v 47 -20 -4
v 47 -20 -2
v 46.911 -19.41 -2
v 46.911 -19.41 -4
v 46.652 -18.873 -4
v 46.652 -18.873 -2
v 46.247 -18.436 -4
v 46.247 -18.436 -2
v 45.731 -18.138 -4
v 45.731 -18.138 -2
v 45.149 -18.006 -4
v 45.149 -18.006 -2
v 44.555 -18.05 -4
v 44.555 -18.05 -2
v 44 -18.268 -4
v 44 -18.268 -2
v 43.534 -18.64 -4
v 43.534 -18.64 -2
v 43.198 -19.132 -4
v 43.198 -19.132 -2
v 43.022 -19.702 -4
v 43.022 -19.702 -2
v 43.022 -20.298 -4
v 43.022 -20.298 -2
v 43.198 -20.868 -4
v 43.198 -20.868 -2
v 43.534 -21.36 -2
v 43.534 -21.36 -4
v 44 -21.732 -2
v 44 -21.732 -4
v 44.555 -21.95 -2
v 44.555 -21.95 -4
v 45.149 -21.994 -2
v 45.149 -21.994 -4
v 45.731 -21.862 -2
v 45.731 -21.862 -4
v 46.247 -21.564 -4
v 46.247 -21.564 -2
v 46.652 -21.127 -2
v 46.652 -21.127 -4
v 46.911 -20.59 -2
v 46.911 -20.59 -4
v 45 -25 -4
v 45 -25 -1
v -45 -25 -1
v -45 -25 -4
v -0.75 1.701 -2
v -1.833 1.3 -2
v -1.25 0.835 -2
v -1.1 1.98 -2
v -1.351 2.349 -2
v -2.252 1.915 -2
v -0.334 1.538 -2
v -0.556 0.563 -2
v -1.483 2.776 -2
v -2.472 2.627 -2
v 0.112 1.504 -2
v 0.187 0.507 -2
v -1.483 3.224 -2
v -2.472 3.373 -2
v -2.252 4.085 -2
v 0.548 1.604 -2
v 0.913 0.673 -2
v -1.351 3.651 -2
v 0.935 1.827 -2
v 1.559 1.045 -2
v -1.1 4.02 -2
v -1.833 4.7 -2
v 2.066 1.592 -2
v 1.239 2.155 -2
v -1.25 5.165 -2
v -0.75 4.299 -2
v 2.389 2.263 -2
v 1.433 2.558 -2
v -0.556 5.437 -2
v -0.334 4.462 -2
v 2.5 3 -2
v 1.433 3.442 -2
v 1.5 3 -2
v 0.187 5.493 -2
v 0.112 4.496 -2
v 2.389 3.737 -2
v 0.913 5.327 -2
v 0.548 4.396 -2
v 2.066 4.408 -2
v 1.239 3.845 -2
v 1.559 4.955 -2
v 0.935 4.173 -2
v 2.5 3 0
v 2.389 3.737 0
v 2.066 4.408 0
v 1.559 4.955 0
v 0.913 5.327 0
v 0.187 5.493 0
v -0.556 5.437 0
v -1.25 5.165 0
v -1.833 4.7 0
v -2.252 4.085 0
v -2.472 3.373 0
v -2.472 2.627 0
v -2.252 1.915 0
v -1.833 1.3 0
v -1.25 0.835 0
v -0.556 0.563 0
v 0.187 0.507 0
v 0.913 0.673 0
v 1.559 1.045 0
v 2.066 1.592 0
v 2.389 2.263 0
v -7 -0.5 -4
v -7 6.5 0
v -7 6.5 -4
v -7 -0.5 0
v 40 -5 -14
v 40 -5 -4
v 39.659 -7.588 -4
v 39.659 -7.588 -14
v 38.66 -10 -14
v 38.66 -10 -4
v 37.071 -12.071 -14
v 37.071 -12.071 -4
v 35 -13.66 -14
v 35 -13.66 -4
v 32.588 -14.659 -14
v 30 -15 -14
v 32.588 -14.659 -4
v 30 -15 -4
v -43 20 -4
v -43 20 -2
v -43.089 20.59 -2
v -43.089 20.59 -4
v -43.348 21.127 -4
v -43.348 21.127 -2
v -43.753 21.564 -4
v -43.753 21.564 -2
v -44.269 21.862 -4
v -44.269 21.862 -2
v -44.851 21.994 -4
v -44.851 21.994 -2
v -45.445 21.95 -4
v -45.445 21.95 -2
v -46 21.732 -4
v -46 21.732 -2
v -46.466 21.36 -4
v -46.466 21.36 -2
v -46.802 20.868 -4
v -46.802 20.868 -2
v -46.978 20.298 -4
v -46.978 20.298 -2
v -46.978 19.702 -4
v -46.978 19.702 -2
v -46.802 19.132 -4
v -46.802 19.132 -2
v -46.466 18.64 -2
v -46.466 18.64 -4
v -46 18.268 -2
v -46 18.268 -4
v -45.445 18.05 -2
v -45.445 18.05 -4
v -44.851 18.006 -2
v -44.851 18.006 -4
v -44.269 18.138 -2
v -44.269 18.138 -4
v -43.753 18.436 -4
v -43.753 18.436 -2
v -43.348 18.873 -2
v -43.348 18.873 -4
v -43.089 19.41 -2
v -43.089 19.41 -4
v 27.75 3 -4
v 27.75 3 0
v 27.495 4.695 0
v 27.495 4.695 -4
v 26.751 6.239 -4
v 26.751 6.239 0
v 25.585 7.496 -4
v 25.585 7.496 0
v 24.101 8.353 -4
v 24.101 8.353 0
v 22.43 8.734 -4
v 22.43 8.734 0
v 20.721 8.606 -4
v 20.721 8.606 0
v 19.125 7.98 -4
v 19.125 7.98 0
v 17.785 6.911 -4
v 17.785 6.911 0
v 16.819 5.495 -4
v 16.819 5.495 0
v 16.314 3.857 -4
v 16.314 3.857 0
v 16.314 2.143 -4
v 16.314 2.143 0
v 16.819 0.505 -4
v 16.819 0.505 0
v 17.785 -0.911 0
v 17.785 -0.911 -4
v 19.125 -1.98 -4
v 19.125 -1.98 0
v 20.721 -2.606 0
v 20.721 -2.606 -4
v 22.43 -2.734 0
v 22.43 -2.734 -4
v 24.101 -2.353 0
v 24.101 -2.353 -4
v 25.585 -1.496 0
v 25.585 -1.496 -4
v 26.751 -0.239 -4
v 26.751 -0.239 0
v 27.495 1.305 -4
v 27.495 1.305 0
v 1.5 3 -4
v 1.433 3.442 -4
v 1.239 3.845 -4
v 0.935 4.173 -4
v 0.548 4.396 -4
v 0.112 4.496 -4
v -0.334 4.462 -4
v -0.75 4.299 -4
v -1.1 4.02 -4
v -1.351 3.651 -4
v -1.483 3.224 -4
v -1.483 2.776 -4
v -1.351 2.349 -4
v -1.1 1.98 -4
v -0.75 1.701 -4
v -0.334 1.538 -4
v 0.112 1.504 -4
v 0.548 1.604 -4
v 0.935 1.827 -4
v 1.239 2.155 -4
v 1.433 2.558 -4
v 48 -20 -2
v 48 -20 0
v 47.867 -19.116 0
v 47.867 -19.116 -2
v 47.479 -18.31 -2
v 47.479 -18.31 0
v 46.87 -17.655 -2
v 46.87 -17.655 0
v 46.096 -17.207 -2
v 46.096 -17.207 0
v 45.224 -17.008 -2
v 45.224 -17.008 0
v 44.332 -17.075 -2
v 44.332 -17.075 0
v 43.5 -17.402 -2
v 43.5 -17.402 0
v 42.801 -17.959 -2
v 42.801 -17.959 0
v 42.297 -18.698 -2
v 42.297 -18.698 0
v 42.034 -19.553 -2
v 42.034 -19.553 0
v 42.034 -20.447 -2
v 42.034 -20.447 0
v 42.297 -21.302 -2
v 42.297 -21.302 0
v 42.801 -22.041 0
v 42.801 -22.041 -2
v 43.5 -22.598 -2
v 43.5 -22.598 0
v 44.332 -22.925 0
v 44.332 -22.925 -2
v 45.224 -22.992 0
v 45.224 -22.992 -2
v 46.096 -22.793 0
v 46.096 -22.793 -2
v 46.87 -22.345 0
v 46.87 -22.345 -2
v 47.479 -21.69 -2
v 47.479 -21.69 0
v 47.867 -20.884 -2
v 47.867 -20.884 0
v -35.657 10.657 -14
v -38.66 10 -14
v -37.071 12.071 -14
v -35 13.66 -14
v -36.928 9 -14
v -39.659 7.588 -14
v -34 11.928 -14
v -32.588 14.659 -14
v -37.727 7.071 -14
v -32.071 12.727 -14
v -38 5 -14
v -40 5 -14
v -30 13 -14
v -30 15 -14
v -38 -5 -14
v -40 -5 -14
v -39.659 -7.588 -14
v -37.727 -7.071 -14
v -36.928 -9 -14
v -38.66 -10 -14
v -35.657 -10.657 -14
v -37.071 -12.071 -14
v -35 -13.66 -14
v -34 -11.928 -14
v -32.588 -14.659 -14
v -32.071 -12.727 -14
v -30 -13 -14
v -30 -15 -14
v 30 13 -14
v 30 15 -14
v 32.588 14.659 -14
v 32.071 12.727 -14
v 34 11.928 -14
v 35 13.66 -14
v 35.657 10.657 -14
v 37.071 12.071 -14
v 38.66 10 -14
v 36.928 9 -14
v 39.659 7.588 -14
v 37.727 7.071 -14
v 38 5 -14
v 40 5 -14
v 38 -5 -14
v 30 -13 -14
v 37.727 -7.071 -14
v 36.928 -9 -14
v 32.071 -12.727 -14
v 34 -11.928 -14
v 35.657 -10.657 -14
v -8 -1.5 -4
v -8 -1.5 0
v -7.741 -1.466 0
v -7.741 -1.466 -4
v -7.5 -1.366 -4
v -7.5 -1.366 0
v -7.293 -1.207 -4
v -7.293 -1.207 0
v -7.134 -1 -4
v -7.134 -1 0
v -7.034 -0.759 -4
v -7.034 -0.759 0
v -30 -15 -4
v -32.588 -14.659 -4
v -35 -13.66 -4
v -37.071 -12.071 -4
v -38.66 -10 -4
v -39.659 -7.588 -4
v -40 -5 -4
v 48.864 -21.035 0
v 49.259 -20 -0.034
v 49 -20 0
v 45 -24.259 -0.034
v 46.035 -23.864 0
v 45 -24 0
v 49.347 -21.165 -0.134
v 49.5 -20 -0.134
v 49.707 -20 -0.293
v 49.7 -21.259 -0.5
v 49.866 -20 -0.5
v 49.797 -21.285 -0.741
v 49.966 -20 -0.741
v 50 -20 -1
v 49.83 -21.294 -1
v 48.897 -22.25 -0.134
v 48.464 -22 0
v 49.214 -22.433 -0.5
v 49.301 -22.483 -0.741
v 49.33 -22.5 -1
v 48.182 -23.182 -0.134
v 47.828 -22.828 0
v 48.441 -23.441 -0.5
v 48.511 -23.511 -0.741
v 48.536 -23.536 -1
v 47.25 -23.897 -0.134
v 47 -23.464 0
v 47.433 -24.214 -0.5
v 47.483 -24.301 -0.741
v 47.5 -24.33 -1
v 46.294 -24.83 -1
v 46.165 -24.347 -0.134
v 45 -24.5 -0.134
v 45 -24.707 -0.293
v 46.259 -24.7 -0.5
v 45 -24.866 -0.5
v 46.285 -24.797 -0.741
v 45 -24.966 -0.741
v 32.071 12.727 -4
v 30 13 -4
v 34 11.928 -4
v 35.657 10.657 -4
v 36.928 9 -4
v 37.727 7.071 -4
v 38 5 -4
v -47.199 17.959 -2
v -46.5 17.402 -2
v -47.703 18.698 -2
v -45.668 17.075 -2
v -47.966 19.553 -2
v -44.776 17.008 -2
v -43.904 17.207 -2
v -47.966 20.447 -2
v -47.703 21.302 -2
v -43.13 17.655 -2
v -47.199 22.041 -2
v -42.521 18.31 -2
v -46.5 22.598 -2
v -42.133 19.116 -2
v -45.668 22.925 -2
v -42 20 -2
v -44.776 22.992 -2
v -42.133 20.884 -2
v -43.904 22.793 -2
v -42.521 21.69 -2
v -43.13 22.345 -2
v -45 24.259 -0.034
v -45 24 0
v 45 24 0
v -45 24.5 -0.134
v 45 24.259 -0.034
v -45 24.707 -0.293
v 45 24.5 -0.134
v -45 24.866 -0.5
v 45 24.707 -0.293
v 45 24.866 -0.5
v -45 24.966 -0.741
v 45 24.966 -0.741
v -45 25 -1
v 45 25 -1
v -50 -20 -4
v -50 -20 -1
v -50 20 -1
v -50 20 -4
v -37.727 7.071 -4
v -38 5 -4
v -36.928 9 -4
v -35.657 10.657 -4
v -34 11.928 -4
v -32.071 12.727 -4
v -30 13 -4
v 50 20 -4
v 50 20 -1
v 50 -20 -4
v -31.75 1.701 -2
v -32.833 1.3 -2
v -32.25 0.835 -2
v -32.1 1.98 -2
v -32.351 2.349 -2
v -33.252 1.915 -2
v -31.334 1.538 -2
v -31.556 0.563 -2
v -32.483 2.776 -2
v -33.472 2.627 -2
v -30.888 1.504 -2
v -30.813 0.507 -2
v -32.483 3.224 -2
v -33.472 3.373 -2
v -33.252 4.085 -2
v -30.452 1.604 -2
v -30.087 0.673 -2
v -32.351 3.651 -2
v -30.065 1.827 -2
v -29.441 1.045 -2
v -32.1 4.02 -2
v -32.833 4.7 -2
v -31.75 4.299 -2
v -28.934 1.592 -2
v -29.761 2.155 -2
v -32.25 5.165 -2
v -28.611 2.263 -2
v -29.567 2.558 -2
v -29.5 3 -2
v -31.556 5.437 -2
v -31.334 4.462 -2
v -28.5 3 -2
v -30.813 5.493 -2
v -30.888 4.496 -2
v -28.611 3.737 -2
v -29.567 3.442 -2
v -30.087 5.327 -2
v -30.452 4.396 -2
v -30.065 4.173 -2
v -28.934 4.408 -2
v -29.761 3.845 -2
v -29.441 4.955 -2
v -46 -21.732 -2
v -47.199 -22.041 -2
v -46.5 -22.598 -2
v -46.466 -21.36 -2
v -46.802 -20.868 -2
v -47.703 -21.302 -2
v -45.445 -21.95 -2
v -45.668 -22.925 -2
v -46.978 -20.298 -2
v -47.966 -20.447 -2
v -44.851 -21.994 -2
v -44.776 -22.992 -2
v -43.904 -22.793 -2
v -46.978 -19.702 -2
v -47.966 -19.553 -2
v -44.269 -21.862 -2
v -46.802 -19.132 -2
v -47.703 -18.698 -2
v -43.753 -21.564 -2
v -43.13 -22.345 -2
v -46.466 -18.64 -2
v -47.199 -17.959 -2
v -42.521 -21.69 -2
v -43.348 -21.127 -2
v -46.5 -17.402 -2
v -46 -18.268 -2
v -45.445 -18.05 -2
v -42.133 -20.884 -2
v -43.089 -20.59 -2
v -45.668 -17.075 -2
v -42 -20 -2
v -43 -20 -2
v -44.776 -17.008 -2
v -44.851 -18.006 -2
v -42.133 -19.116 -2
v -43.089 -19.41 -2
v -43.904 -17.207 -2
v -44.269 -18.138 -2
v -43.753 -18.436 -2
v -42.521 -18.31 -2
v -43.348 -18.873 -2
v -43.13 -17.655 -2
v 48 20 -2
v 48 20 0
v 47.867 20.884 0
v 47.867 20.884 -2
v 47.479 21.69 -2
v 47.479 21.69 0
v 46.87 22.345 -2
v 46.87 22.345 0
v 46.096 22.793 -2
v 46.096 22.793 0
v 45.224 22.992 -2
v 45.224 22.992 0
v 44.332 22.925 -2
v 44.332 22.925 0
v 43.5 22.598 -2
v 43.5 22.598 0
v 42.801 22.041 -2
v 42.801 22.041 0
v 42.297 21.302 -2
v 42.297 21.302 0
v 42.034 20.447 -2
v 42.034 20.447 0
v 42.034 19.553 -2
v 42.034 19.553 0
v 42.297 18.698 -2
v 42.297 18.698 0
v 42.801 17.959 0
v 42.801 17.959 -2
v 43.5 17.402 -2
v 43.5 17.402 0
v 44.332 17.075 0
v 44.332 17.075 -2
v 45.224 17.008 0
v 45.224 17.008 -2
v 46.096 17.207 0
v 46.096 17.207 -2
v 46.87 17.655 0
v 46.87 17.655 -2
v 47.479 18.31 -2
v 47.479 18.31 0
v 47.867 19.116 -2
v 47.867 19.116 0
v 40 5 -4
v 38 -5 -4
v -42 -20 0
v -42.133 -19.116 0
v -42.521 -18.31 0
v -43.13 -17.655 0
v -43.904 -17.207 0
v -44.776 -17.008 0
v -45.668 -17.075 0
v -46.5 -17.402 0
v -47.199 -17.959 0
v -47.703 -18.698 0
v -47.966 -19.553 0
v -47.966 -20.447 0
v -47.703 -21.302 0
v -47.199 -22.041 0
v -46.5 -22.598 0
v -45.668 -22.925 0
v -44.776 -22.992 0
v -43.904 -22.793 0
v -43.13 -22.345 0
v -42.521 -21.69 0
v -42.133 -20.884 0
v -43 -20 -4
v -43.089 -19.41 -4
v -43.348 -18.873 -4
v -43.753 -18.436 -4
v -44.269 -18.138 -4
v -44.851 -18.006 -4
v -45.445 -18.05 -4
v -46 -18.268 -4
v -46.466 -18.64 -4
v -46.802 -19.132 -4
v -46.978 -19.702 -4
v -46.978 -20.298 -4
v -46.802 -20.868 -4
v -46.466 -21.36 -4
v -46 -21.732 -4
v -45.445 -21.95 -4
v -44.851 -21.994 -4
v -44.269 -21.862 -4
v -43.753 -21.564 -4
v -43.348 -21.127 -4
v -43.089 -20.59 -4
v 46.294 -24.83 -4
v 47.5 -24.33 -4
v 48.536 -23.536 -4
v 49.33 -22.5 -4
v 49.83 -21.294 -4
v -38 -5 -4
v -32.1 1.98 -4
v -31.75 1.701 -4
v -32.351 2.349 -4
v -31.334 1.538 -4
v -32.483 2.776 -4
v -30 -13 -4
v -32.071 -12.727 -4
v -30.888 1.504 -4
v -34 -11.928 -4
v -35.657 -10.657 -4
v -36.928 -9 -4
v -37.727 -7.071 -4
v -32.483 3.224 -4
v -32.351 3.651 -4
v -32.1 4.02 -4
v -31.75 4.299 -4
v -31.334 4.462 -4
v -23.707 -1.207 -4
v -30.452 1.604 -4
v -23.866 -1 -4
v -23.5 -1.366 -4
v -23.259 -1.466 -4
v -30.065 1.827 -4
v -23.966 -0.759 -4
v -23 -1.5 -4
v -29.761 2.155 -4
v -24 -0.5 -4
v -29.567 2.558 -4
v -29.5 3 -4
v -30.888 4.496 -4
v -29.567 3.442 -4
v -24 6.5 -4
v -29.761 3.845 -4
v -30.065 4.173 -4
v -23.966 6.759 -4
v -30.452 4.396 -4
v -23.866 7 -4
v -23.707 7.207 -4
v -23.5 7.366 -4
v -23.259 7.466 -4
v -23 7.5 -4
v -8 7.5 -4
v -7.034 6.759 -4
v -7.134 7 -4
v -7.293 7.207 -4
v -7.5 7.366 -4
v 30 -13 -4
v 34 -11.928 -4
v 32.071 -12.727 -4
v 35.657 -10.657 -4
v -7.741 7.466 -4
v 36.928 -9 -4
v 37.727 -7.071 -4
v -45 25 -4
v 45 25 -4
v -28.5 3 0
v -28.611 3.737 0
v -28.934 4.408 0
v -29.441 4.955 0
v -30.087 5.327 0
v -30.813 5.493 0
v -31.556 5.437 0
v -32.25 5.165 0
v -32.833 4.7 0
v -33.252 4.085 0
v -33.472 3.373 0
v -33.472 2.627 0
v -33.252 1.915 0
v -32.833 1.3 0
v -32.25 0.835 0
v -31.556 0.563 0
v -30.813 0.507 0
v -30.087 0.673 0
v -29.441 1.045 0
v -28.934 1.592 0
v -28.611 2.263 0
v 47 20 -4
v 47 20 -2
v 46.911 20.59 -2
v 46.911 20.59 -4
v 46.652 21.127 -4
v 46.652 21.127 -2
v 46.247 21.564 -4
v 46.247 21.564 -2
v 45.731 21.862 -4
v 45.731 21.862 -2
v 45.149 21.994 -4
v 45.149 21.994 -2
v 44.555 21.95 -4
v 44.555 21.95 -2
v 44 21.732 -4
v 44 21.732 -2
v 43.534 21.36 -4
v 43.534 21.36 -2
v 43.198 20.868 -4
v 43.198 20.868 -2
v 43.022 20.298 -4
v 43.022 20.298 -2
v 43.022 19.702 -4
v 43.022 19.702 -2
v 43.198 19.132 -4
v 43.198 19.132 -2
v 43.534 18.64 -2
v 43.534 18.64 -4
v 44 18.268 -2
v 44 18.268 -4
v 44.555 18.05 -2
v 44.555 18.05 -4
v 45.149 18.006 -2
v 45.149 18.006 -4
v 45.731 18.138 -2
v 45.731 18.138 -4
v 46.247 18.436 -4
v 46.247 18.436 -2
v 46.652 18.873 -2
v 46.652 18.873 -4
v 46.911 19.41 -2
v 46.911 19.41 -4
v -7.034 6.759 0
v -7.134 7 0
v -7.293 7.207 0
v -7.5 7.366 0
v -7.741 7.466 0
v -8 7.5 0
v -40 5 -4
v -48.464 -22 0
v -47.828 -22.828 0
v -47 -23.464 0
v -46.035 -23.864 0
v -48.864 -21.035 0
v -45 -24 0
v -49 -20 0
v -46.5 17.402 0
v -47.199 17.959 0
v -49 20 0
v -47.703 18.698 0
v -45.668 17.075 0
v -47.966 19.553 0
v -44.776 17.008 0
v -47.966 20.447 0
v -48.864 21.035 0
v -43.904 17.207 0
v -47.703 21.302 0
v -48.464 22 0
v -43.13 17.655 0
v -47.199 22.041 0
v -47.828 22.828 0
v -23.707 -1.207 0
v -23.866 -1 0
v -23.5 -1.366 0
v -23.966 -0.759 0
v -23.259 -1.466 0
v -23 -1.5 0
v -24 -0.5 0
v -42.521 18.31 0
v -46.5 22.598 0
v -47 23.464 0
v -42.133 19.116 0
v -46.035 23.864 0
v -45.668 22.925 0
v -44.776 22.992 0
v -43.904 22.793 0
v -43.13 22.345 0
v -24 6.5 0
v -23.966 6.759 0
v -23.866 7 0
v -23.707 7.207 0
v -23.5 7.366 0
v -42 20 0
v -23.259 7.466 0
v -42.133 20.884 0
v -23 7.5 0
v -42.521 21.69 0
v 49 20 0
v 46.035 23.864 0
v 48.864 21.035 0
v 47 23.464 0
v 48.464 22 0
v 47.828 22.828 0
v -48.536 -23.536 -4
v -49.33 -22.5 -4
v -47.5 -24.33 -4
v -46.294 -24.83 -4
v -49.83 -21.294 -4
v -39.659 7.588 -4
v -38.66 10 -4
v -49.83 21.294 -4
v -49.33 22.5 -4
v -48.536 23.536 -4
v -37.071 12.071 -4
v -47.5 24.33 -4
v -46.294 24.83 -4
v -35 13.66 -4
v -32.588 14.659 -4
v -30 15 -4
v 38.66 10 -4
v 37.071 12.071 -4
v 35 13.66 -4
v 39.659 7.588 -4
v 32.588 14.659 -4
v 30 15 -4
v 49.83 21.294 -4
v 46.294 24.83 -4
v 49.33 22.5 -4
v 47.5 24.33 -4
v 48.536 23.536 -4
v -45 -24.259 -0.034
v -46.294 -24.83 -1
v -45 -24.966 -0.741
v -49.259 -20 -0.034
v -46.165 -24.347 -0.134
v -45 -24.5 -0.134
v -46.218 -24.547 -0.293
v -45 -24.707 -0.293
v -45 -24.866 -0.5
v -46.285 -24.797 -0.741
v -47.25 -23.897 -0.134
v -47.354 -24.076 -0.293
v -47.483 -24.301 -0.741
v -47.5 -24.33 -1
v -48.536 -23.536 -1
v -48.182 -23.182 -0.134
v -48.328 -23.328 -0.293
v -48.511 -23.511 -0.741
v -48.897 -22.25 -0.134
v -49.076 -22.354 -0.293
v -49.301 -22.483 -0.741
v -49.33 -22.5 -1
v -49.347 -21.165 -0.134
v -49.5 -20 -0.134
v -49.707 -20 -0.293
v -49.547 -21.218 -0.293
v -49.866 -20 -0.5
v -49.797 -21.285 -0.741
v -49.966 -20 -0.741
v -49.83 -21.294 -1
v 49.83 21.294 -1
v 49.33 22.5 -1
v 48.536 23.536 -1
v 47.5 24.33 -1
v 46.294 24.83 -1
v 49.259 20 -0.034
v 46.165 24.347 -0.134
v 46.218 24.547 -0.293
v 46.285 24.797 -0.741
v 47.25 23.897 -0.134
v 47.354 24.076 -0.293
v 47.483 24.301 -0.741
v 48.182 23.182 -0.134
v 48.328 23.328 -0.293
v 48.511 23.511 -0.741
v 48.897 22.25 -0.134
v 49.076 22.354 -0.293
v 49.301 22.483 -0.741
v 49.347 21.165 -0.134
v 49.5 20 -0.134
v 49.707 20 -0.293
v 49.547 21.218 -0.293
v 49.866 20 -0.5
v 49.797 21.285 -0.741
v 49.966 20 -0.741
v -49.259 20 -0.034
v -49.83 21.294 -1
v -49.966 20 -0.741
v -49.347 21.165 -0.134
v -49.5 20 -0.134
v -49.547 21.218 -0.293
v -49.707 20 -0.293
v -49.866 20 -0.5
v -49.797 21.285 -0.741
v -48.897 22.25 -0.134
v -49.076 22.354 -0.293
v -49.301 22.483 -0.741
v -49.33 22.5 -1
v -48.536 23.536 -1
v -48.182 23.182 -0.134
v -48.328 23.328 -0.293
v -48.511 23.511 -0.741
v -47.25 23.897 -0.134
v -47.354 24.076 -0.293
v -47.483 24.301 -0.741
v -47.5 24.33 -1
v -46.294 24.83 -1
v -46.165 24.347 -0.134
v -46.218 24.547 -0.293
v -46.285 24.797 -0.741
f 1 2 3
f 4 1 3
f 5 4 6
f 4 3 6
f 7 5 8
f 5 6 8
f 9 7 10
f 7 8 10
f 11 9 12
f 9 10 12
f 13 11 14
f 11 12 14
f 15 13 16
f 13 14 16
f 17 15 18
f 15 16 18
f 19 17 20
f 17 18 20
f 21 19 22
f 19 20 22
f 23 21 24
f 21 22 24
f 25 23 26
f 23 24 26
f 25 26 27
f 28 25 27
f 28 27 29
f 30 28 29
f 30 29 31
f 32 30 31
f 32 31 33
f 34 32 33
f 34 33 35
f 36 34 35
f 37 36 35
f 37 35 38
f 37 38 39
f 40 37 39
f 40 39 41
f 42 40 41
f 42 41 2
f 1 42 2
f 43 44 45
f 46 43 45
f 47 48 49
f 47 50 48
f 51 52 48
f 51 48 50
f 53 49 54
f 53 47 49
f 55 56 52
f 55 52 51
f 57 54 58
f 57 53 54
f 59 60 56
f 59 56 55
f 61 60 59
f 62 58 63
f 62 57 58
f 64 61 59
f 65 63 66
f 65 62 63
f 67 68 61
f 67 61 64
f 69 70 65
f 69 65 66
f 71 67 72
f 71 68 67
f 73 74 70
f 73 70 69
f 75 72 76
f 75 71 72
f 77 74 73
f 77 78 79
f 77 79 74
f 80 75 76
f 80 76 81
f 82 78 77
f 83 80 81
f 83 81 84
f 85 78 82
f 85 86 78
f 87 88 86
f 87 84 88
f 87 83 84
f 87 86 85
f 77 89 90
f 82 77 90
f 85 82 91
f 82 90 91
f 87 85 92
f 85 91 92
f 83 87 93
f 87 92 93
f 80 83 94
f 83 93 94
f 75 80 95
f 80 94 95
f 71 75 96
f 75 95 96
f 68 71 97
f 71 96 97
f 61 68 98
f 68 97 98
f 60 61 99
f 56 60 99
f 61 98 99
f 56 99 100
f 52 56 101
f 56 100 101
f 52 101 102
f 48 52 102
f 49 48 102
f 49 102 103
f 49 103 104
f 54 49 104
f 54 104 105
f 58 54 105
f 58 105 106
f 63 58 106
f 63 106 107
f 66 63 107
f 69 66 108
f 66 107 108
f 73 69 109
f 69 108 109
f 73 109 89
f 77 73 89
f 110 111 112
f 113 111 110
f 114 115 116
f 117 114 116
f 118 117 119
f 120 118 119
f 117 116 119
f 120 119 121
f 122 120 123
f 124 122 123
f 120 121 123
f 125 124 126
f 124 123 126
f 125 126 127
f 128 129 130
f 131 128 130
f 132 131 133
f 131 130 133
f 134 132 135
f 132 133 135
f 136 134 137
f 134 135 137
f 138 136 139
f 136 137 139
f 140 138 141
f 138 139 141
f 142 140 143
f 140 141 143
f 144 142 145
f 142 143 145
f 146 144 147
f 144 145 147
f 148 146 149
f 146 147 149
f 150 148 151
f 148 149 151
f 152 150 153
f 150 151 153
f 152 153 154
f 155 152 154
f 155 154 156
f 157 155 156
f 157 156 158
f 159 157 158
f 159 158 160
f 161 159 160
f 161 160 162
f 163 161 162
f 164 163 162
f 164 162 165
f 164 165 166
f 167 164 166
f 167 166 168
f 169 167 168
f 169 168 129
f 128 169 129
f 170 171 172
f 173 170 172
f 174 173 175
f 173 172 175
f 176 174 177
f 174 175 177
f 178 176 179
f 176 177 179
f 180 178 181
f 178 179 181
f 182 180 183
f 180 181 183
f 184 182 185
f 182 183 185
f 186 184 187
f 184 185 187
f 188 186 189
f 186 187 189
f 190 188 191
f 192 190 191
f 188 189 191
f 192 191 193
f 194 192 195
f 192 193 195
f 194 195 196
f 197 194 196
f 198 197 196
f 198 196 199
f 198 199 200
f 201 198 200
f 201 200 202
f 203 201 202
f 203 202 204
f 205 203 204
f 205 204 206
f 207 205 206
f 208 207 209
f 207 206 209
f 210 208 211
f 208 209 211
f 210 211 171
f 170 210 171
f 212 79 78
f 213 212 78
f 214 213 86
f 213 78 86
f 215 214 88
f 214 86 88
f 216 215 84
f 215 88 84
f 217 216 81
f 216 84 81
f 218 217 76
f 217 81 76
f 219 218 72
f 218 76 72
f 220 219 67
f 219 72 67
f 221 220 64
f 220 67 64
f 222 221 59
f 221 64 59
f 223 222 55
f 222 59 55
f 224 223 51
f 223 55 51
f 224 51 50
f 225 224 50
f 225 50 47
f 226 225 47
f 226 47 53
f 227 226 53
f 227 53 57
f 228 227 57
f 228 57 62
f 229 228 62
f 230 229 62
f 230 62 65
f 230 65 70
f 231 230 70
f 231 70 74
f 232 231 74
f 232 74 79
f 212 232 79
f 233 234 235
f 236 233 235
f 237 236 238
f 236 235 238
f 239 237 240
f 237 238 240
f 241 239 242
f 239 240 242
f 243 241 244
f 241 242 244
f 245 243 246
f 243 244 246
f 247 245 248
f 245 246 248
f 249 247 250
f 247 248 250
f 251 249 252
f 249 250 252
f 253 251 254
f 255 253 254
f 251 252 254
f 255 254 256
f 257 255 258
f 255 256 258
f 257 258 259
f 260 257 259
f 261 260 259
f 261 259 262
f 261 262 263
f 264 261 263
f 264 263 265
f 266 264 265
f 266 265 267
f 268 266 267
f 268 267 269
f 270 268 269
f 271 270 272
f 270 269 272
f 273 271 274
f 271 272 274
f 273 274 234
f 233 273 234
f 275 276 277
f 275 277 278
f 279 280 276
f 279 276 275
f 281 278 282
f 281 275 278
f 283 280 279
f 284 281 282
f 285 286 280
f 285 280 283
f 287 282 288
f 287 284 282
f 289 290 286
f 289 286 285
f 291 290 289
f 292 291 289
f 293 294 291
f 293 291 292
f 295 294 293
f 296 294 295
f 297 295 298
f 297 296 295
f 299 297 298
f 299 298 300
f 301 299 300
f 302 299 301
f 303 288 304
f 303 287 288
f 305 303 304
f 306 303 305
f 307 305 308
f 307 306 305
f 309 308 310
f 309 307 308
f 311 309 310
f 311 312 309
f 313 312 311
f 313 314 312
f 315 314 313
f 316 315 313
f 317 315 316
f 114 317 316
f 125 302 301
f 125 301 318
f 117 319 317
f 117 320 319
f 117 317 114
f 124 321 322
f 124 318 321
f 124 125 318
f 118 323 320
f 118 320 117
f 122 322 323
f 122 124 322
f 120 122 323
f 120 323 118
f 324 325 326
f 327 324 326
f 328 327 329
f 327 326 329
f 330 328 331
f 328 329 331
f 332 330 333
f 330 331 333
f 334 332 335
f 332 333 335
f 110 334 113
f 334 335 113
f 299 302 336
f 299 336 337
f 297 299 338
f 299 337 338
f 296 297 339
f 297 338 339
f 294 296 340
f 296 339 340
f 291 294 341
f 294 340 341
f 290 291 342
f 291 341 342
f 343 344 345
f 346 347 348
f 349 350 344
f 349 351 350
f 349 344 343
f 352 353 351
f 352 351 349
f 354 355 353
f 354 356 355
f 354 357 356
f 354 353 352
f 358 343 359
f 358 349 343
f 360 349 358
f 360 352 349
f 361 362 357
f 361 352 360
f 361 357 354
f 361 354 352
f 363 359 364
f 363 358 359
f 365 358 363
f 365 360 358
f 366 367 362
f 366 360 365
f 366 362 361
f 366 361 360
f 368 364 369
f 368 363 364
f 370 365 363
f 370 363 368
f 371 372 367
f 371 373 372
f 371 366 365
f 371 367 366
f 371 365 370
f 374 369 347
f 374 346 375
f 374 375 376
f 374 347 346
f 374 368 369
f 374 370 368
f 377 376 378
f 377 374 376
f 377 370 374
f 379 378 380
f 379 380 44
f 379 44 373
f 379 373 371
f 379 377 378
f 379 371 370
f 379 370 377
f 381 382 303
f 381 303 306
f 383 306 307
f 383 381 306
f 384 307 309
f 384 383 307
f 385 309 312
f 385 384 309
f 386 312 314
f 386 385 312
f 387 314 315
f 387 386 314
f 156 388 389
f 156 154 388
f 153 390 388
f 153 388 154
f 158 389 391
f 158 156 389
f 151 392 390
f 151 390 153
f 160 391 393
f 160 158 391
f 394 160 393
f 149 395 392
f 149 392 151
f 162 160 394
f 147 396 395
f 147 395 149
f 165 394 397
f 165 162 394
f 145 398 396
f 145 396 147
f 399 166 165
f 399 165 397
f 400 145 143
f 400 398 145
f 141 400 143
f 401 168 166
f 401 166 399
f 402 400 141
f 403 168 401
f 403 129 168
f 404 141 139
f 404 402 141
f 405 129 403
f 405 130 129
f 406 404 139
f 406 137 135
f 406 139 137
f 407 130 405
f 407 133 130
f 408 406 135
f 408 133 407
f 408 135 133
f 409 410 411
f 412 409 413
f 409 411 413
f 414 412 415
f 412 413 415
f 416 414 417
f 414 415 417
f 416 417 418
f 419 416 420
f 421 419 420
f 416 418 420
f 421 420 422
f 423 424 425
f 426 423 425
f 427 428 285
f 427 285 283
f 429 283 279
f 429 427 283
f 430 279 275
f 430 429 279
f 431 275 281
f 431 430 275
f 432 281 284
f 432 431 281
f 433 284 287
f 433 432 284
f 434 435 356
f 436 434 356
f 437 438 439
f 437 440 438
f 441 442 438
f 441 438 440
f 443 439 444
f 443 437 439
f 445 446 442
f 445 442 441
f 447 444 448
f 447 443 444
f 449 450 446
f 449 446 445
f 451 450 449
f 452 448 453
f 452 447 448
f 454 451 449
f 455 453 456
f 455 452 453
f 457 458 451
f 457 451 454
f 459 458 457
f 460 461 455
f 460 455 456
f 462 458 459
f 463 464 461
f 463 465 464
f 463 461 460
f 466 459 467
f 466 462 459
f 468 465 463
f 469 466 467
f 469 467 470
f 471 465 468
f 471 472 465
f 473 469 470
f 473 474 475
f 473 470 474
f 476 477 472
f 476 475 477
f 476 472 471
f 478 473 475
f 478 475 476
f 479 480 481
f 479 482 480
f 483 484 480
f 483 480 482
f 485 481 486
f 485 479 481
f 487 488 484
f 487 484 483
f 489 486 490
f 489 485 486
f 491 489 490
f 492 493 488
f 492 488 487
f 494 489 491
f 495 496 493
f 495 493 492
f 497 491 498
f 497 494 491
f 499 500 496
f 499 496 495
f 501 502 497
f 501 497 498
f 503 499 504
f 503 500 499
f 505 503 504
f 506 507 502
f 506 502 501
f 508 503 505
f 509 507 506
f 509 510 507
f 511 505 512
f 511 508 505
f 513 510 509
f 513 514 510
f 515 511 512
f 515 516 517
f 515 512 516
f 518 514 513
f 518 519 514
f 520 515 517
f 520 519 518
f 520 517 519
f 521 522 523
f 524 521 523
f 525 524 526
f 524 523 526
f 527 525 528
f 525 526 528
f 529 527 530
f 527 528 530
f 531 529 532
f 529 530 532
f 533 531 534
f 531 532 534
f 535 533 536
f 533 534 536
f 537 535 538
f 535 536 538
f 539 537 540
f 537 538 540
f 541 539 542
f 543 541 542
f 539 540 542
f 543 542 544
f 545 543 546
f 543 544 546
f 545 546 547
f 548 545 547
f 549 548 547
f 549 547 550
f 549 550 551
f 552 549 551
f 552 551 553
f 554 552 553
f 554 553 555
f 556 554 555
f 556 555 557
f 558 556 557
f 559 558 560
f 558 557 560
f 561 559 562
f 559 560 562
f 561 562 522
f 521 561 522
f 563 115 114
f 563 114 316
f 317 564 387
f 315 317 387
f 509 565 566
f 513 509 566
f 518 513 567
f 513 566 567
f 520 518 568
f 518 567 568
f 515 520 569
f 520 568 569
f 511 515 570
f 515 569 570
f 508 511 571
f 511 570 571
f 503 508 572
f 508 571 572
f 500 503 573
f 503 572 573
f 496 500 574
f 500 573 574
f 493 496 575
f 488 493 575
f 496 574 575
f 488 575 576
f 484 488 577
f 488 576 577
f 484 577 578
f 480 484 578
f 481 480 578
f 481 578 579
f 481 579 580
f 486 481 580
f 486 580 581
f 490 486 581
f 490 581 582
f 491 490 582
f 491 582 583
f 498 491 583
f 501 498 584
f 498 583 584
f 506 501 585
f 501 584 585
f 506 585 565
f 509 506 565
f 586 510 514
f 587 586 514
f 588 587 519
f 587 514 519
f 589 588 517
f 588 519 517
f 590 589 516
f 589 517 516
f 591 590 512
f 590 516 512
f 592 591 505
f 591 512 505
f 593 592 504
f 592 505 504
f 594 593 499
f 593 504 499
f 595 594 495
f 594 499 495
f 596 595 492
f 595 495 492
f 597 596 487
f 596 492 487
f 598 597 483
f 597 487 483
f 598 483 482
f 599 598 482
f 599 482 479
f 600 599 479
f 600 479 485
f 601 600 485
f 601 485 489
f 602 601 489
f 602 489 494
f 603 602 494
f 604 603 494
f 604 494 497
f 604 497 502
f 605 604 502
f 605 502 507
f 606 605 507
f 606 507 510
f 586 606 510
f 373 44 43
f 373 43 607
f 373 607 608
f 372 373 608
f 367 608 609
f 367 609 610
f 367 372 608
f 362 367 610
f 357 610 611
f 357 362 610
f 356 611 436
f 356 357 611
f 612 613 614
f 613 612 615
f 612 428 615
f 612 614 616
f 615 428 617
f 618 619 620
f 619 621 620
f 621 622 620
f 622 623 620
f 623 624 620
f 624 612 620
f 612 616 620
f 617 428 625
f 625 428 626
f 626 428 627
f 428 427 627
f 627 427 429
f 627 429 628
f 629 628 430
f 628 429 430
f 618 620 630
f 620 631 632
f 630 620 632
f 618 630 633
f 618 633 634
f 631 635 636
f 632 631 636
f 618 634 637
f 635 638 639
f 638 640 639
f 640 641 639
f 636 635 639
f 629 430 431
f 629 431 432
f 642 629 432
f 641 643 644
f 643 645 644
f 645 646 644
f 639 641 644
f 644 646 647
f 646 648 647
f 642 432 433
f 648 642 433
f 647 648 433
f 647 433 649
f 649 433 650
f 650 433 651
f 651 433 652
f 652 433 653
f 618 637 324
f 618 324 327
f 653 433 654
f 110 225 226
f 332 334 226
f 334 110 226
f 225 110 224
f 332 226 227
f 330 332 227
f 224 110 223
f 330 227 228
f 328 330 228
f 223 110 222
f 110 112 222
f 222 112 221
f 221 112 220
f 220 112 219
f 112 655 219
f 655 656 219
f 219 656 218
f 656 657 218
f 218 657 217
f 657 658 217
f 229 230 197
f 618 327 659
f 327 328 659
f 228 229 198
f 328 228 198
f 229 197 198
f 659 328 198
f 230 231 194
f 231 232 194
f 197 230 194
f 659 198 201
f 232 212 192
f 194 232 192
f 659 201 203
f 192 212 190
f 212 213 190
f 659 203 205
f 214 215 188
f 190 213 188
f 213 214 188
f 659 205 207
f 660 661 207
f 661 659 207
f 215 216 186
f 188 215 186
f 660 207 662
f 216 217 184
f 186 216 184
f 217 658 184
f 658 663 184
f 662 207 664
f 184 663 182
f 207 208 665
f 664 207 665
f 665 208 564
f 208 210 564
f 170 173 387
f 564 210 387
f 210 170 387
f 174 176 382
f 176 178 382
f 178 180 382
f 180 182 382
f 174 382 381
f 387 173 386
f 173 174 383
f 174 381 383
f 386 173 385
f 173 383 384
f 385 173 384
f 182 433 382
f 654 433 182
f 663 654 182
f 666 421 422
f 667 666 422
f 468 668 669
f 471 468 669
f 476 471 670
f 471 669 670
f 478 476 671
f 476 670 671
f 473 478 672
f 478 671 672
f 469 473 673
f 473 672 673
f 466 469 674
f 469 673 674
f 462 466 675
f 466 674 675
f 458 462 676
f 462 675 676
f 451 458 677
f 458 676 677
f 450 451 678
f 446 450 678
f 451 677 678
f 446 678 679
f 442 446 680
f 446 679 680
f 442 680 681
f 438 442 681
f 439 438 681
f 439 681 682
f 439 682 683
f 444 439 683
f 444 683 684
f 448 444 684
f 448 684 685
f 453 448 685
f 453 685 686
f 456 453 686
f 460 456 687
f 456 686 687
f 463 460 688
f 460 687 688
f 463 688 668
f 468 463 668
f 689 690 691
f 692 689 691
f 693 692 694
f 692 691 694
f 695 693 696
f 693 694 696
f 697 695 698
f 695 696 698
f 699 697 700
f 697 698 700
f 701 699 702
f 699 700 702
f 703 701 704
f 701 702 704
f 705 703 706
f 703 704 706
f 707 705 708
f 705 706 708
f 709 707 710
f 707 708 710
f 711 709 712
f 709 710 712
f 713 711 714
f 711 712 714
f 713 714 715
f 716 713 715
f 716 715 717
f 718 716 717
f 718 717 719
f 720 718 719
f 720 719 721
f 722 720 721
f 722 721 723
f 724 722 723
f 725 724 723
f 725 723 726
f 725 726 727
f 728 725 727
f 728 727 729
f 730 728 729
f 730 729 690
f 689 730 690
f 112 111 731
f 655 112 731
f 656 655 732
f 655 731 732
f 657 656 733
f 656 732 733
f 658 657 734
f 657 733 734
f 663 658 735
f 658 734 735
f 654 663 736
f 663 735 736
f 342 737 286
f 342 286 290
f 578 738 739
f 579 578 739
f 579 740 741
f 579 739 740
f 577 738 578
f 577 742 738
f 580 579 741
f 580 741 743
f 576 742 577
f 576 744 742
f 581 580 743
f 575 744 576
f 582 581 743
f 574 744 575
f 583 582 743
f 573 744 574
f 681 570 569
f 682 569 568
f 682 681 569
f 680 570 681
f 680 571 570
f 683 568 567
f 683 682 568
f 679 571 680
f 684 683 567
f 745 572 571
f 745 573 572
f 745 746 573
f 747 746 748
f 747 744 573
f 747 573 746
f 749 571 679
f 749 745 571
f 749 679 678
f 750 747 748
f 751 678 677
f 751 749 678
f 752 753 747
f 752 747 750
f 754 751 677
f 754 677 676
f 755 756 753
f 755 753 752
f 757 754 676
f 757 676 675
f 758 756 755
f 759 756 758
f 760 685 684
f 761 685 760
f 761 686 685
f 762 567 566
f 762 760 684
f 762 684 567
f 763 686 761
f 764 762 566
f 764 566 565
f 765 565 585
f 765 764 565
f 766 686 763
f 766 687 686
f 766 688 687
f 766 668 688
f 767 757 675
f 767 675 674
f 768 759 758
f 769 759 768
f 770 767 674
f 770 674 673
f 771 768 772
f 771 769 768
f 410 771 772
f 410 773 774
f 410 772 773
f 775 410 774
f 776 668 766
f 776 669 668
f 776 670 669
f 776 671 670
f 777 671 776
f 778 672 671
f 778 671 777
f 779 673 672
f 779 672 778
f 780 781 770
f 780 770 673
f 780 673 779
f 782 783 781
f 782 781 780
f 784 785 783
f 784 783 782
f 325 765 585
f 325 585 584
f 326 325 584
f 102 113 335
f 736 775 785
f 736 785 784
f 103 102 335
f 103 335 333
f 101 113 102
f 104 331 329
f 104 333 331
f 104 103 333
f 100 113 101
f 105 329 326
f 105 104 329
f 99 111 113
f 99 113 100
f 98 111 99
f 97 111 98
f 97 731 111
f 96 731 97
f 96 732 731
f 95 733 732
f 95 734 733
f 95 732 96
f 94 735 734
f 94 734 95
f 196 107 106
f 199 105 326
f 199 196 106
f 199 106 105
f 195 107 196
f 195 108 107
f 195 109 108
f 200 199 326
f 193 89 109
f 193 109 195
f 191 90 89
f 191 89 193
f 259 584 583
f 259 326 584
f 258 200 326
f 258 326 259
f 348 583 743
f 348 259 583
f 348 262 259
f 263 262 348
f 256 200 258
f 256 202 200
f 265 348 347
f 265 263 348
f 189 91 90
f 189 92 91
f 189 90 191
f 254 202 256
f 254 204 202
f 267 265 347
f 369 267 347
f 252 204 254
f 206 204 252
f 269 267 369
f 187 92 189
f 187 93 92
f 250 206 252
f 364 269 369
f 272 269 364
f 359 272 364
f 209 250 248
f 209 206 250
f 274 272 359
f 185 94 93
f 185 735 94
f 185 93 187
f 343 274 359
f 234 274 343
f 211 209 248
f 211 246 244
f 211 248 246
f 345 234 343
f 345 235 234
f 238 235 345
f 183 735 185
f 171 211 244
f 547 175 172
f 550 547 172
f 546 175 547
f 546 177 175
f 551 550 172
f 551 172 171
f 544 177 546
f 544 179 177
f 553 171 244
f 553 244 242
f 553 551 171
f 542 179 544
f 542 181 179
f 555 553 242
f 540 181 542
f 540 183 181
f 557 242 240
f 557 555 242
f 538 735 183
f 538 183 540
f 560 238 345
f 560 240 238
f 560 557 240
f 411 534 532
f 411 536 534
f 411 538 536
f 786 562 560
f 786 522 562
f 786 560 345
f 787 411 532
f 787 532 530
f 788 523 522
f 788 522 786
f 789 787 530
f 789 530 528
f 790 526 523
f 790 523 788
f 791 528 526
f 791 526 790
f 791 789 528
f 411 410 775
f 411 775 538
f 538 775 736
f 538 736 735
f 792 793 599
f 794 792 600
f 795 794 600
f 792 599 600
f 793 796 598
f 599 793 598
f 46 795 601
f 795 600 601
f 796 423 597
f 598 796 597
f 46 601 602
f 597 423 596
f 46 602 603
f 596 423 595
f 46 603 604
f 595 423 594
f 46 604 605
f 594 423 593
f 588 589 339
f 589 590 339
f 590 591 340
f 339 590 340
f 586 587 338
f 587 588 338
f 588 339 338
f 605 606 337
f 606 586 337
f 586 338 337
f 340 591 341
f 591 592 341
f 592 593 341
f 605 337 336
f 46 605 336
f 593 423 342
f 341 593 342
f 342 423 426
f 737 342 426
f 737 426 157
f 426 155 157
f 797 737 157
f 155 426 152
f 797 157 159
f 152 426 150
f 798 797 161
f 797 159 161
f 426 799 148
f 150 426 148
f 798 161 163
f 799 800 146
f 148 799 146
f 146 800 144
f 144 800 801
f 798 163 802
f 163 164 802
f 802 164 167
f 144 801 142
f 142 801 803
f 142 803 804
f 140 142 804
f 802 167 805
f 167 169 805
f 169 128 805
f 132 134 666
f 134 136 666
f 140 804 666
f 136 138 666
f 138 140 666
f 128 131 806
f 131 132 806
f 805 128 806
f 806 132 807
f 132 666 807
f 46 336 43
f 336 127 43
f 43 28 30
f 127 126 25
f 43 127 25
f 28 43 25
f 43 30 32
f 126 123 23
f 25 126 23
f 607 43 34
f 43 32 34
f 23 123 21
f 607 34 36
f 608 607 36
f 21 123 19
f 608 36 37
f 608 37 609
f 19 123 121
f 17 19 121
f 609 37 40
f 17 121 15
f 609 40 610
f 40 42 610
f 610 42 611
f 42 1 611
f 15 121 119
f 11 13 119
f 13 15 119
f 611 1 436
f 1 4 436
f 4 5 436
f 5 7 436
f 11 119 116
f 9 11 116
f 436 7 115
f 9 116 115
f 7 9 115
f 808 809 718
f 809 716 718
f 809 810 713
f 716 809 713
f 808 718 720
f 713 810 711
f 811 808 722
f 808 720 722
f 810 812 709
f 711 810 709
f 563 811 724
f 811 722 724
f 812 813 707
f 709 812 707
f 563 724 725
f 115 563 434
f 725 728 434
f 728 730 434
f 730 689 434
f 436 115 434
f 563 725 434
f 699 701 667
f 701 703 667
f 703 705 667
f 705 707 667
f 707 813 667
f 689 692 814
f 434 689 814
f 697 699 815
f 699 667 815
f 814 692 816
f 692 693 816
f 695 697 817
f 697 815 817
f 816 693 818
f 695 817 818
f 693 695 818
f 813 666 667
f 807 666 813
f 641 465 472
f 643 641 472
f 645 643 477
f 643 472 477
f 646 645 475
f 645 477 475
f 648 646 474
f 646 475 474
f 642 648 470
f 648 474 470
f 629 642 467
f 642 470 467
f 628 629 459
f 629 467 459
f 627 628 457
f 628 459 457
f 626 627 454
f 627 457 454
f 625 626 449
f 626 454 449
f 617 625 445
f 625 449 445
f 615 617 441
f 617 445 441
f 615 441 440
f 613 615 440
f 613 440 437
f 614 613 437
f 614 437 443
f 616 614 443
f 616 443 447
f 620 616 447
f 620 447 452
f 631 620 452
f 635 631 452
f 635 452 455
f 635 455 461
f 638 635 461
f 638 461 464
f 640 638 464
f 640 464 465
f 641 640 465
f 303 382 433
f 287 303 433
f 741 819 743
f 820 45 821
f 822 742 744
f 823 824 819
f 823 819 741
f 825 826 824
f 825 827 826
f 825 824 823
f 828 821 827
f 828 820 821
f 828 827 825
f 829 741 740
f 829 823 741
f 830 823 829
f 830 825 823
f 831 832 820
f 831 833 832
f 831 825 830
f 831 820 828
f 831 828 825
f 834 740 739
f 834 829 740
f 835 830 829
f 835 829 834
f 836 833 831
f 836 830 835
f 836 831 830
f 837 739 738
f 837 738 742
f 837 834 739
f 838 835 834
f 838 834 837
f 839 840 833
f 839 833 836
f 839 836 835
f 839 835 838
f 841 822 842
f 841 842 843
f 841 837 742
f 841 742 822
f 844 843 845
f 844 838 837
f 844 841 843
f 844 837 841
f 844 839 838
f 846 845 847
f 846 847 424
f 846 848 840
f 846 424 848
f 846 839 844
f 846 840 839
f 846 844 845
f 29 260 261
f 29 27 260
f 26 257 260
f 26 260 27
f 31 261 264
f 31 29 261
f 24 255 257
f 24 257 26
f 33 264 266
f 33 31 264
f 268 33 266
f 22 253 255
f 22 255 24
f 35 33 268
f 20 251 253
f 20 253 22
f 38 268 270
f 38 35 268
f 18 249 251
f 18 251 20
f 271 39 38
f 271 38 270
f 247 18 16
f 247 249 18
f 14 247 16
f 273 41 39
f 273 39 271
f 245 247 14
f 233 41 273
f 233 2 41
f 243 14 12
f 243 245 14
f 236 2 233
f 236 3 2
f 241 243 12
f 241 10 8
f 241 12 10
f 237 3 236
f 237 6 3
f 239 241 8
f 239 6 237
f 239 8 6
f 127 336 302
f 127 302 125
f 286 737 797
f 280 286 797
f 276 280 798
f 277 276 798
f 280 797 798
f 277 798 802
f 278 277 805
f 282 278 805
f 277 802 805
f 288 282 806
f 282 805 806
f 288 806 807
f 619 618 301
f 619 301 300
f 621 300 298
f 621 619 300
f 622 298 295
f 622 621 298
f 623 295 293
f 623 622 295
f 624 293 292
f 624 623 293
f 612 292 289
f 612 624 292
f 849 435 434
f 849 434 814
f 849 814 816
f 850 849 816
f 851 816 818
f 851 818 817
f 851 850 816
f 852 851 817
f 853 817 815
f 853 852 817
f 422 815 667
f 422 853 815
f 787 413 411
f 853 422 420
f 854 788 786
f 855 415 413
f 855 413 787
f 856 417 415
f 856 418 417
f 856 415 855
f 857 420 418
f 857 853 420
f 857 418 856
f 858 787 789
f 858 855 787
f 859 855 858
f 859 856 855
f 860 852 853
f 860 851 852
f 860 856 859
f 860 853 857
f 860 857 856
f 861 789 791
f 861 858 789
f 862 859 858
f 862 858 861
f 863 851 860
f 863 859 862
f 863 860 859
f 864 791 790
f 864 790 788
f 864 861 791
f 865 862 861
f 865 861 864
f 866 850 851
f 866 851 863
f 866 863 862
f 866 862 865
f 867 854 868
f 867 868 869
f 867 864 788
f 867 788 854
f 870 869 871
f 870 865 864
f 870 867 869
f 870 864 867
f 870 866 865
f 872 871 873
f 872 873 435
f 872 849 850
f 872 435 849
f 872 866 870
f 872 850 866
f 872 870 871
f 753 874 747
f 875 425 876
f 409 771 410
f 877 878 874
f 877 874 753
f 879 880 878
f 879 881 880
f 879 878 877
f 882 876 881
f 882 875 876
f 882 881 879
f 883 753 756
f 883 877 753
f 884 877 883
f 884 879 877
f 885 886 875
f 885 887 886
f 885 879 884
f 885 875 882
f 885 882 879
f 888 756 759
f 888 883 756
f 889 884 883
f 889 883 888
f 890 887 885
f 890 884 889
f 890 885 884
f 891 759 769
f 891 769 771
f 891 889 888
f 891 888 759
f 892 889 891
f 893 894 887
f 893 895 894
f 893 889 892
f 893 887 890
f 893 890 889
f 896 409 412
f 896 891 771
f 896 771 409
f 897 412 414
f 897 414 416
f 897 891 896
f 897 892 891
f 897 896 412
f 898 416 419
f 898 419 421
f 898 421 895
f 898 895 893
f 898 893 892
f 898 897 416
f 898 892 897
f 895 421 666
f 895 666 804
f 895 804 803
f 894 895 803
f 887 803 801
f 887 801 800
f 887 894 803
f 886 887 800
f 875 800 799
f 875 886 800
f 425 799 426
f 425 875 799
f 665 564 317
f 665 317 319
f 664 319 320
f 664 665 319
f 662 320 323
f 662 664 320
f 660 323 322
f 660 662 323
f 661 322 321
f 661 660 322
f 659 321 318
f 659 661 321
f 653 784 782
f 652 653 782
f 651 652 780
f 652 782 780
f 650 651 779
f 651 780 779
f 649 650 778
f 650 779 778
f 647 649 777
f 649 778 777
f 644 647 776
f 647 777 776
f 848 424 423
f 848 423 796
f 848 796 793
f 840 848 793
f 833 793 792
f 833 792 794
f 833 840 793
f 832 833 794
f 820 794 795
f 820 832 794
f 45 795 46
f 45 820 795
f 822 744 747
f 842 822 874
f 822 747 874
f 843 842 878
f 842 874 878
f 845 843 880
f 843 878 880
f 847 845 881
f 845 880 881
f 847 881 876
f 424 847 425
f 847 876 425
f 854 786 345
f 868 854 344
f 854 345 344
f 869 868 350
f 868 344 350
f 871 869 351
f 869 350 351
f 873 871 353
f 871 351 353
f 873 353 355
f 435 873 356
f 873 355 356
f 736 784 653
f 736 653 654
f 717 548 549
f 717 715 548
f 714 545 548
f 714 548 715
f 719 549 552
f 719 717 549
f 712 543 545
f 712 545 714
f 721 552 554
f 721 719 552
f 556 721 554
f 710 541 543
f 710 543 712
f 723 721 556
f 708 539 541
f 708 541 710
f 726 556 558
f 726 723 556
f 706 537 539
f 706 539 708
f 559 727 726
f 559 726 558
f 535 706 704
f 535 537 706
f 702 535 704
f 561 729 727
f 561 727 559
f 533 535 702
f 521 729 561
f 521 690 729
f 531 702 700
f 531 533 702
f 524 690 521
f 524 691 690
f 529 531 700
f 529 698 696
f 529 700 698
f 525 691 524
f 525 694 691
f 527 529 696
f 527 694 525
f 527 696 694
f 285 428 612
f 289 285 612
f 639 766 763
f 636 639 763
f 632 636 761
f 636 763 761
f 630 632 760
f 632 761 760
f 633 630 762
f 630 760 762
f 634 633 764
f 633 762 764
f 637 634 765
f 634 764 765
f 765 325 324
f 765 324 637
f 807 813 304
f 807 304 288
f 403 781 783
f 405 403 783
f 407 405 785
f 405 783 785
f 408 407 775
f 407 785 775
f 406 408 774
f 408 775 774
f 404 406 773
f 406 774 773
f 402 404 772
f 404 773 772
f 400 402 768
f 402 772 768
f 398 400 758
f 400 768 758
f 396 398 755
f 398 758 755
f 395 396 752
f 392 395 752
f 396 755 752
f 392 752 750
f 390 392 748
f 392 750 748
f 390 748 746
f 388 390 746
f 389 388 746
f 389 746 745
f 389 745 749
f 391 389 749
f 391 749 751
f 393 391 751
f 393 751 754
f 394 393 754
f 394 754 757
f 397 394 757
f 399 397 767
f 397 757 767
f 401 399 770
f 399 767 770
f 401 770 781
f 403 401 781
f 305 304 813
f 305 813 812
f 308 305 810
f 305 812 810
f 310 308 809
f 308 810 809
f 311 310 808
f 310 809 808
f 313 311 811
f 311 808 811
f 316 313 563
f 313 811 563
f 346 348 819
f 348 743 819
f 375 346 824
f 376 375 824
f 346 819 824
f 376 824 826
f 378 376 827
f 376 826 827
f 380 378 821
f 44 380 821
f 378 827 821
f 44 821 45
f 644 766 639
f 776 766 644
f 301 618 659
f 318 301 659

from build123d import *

# Parameters (mm, degrees)
SKETCH_R      = 2
SKETCH_R_2    = 1.5
SKETCH_R_3    = 5.75
PAD_DEPTH     = 4
PAD001_DEPTH  = 10
SKETCH002_R   = 3
SKETCH002_R_2 = 2.5
POCKET_DEPTH  = 2
FILLET_R      = 1


with BuildPart() as part:
    # Sketch → Pad (new body)
    with BuildSketch(Plane.XY):
        with BuildLine():
            ThreePointArc((-45, 25), (-48.535534, 23.535534), (-50, 20))
            Line((-50, -20), (-50, 20))
            ThreePointArc((-50, -20), (-48.535534, -23.535534), (-45, -25))
            Line((45, -25), (-45, -25))
            ThreePointArc((45, -25), (48.535534, -23.535534), (50, -20))
            Line((50, 20), (50, -20))
            ThreePointArc((50, 20), (48.535534, 23.535534), (45, 25))
            Line((-45, 25), (45, 25))
        make_face()
        with Locations((-45, 20)):
            Circle(SKETCH_R, mode=Mode.SUBTRACT)
        with Locations((45, 20)):
            Circle(SKETCH_R, mode=Mode.SUBTRACT)
        with Locations((-45, -20)):
            Circle(SKETCH_R, mode=Mode.SUBTRACT)
        with Locations((45, -20)):
            Circle(SKETCH_R, mode=Mode.SUBTRACT)
        with Locations((-31, 3)):
            Circle(SKETCH_R_2, mode=Mode.SUBTRACT)
        with Locations((0, 3)):
            Circle(SKETCH_R_2, mode=Mode.SUBTRACT)
        with Locations((22, 3)):
            Circle(SKETCH_R_3, mode=Mode.SUBTRACT)
        with BuildLine():
            ThreePointArc((-23, 7.5), (-23.707107, 7.207107), (-24, 6.5))
            Line((-24, -0.5), (-24, 6.5))
            ThreePointArc((-24, -0.5), (-23.707107, -1.207107), (-23, -1.5))
            Line((-8, -1.5), (-23, -1.5))
            ThreePointArc((-8, -1.5), (-7.292893, -1.207107), (-7, -0.5))
            Line((-7, 6.5), (-7, -0.5))
            ThreePointArc((-7, 6.5), (-7.292893, 7.207107), (-8, 7.5))
            Line((-23, 7.5), (-8, 7.5))
        make_face(mode=Mode.SUBTRACT)
    extrude(amount=-PAD_DEPTH)

    # Sketch001 (on Face25 of Pad) → Pad001 (join)
    with BuildSketch(Plane(origin=(0, 0, -4), x_dir=(1, 0, 0), z_dir=(0, 0, -1))):
        with BuildLine():
            ThreePointArc((-30, 15), (-37.071068, 12.071068), (-40, 5))
            Line((-40, -5), (-40, 5))
            ThreePointArc((-40, -5), (-37.071068, -12.071068), (-30, -15))
            Line((30, -15), (-30, -15))
            ThreePointArc((30, -15), (37.071068, -12.071068), (40, -5))
            Line((40, 5), (40, -5))
            ThreePointArc((40, 5), (37.071068, 12.071068), (30, 15))
            Line((-30, 15), (30, 15))
        make_face()
        with BuildLine():
            ThreePointArc((-30, 13), (-35.656854, 10.656854), (-38, 5))
            Line((-38, -5), (-38, 5))
            ThreePointArc((-38, -5), (-35.656854, -10.656854), (-30, -13))
            Line((30, -13), (-30, -13))
            ThreePointArc((30, -13), (35.656854, -10.656854), (38, -5))
            Line((38, 5), (38, -5))
            ThreePointArc((38, 5), (35.656854, 10.656854), (30, 13))
            Line((-30, 13), (30, 13))
        make_face(mode=Mode.SUBTRACT)
    extrude(amount=PAD001_DEPTH)

    # Sketch002 (on Face4 of Pad001) → Pocket (cut)
    with BuildSketch(Plane.XY):
        with Locations((-45, 20)):
            Circle(SKETCH002_R)
        with Locations((45, 20)):
            Circle(SKETCH002_R)
        with Locations((45, -20)):
            Circle(SKETCH002_R)
        with Locations((-45, -20)):
            Circle(SKETCH002_R)
        with Locations((-31, 3)):
            Circle(SKETCH002_R_2)
        with Locations((0, 3)):
            Circle(SKETCH002_R_2)
    extrude(amount=-POCKET_DEPTH, mode=Mode.SUBTRACT)

    # Fillet
    fillet_edges = [part.edges().sort_by_distance(p)[0] for p in [
        (0, -25, 0),
    ]]
    fillet(fillet_edges, radius=FILLET_R)


solid = part.part
